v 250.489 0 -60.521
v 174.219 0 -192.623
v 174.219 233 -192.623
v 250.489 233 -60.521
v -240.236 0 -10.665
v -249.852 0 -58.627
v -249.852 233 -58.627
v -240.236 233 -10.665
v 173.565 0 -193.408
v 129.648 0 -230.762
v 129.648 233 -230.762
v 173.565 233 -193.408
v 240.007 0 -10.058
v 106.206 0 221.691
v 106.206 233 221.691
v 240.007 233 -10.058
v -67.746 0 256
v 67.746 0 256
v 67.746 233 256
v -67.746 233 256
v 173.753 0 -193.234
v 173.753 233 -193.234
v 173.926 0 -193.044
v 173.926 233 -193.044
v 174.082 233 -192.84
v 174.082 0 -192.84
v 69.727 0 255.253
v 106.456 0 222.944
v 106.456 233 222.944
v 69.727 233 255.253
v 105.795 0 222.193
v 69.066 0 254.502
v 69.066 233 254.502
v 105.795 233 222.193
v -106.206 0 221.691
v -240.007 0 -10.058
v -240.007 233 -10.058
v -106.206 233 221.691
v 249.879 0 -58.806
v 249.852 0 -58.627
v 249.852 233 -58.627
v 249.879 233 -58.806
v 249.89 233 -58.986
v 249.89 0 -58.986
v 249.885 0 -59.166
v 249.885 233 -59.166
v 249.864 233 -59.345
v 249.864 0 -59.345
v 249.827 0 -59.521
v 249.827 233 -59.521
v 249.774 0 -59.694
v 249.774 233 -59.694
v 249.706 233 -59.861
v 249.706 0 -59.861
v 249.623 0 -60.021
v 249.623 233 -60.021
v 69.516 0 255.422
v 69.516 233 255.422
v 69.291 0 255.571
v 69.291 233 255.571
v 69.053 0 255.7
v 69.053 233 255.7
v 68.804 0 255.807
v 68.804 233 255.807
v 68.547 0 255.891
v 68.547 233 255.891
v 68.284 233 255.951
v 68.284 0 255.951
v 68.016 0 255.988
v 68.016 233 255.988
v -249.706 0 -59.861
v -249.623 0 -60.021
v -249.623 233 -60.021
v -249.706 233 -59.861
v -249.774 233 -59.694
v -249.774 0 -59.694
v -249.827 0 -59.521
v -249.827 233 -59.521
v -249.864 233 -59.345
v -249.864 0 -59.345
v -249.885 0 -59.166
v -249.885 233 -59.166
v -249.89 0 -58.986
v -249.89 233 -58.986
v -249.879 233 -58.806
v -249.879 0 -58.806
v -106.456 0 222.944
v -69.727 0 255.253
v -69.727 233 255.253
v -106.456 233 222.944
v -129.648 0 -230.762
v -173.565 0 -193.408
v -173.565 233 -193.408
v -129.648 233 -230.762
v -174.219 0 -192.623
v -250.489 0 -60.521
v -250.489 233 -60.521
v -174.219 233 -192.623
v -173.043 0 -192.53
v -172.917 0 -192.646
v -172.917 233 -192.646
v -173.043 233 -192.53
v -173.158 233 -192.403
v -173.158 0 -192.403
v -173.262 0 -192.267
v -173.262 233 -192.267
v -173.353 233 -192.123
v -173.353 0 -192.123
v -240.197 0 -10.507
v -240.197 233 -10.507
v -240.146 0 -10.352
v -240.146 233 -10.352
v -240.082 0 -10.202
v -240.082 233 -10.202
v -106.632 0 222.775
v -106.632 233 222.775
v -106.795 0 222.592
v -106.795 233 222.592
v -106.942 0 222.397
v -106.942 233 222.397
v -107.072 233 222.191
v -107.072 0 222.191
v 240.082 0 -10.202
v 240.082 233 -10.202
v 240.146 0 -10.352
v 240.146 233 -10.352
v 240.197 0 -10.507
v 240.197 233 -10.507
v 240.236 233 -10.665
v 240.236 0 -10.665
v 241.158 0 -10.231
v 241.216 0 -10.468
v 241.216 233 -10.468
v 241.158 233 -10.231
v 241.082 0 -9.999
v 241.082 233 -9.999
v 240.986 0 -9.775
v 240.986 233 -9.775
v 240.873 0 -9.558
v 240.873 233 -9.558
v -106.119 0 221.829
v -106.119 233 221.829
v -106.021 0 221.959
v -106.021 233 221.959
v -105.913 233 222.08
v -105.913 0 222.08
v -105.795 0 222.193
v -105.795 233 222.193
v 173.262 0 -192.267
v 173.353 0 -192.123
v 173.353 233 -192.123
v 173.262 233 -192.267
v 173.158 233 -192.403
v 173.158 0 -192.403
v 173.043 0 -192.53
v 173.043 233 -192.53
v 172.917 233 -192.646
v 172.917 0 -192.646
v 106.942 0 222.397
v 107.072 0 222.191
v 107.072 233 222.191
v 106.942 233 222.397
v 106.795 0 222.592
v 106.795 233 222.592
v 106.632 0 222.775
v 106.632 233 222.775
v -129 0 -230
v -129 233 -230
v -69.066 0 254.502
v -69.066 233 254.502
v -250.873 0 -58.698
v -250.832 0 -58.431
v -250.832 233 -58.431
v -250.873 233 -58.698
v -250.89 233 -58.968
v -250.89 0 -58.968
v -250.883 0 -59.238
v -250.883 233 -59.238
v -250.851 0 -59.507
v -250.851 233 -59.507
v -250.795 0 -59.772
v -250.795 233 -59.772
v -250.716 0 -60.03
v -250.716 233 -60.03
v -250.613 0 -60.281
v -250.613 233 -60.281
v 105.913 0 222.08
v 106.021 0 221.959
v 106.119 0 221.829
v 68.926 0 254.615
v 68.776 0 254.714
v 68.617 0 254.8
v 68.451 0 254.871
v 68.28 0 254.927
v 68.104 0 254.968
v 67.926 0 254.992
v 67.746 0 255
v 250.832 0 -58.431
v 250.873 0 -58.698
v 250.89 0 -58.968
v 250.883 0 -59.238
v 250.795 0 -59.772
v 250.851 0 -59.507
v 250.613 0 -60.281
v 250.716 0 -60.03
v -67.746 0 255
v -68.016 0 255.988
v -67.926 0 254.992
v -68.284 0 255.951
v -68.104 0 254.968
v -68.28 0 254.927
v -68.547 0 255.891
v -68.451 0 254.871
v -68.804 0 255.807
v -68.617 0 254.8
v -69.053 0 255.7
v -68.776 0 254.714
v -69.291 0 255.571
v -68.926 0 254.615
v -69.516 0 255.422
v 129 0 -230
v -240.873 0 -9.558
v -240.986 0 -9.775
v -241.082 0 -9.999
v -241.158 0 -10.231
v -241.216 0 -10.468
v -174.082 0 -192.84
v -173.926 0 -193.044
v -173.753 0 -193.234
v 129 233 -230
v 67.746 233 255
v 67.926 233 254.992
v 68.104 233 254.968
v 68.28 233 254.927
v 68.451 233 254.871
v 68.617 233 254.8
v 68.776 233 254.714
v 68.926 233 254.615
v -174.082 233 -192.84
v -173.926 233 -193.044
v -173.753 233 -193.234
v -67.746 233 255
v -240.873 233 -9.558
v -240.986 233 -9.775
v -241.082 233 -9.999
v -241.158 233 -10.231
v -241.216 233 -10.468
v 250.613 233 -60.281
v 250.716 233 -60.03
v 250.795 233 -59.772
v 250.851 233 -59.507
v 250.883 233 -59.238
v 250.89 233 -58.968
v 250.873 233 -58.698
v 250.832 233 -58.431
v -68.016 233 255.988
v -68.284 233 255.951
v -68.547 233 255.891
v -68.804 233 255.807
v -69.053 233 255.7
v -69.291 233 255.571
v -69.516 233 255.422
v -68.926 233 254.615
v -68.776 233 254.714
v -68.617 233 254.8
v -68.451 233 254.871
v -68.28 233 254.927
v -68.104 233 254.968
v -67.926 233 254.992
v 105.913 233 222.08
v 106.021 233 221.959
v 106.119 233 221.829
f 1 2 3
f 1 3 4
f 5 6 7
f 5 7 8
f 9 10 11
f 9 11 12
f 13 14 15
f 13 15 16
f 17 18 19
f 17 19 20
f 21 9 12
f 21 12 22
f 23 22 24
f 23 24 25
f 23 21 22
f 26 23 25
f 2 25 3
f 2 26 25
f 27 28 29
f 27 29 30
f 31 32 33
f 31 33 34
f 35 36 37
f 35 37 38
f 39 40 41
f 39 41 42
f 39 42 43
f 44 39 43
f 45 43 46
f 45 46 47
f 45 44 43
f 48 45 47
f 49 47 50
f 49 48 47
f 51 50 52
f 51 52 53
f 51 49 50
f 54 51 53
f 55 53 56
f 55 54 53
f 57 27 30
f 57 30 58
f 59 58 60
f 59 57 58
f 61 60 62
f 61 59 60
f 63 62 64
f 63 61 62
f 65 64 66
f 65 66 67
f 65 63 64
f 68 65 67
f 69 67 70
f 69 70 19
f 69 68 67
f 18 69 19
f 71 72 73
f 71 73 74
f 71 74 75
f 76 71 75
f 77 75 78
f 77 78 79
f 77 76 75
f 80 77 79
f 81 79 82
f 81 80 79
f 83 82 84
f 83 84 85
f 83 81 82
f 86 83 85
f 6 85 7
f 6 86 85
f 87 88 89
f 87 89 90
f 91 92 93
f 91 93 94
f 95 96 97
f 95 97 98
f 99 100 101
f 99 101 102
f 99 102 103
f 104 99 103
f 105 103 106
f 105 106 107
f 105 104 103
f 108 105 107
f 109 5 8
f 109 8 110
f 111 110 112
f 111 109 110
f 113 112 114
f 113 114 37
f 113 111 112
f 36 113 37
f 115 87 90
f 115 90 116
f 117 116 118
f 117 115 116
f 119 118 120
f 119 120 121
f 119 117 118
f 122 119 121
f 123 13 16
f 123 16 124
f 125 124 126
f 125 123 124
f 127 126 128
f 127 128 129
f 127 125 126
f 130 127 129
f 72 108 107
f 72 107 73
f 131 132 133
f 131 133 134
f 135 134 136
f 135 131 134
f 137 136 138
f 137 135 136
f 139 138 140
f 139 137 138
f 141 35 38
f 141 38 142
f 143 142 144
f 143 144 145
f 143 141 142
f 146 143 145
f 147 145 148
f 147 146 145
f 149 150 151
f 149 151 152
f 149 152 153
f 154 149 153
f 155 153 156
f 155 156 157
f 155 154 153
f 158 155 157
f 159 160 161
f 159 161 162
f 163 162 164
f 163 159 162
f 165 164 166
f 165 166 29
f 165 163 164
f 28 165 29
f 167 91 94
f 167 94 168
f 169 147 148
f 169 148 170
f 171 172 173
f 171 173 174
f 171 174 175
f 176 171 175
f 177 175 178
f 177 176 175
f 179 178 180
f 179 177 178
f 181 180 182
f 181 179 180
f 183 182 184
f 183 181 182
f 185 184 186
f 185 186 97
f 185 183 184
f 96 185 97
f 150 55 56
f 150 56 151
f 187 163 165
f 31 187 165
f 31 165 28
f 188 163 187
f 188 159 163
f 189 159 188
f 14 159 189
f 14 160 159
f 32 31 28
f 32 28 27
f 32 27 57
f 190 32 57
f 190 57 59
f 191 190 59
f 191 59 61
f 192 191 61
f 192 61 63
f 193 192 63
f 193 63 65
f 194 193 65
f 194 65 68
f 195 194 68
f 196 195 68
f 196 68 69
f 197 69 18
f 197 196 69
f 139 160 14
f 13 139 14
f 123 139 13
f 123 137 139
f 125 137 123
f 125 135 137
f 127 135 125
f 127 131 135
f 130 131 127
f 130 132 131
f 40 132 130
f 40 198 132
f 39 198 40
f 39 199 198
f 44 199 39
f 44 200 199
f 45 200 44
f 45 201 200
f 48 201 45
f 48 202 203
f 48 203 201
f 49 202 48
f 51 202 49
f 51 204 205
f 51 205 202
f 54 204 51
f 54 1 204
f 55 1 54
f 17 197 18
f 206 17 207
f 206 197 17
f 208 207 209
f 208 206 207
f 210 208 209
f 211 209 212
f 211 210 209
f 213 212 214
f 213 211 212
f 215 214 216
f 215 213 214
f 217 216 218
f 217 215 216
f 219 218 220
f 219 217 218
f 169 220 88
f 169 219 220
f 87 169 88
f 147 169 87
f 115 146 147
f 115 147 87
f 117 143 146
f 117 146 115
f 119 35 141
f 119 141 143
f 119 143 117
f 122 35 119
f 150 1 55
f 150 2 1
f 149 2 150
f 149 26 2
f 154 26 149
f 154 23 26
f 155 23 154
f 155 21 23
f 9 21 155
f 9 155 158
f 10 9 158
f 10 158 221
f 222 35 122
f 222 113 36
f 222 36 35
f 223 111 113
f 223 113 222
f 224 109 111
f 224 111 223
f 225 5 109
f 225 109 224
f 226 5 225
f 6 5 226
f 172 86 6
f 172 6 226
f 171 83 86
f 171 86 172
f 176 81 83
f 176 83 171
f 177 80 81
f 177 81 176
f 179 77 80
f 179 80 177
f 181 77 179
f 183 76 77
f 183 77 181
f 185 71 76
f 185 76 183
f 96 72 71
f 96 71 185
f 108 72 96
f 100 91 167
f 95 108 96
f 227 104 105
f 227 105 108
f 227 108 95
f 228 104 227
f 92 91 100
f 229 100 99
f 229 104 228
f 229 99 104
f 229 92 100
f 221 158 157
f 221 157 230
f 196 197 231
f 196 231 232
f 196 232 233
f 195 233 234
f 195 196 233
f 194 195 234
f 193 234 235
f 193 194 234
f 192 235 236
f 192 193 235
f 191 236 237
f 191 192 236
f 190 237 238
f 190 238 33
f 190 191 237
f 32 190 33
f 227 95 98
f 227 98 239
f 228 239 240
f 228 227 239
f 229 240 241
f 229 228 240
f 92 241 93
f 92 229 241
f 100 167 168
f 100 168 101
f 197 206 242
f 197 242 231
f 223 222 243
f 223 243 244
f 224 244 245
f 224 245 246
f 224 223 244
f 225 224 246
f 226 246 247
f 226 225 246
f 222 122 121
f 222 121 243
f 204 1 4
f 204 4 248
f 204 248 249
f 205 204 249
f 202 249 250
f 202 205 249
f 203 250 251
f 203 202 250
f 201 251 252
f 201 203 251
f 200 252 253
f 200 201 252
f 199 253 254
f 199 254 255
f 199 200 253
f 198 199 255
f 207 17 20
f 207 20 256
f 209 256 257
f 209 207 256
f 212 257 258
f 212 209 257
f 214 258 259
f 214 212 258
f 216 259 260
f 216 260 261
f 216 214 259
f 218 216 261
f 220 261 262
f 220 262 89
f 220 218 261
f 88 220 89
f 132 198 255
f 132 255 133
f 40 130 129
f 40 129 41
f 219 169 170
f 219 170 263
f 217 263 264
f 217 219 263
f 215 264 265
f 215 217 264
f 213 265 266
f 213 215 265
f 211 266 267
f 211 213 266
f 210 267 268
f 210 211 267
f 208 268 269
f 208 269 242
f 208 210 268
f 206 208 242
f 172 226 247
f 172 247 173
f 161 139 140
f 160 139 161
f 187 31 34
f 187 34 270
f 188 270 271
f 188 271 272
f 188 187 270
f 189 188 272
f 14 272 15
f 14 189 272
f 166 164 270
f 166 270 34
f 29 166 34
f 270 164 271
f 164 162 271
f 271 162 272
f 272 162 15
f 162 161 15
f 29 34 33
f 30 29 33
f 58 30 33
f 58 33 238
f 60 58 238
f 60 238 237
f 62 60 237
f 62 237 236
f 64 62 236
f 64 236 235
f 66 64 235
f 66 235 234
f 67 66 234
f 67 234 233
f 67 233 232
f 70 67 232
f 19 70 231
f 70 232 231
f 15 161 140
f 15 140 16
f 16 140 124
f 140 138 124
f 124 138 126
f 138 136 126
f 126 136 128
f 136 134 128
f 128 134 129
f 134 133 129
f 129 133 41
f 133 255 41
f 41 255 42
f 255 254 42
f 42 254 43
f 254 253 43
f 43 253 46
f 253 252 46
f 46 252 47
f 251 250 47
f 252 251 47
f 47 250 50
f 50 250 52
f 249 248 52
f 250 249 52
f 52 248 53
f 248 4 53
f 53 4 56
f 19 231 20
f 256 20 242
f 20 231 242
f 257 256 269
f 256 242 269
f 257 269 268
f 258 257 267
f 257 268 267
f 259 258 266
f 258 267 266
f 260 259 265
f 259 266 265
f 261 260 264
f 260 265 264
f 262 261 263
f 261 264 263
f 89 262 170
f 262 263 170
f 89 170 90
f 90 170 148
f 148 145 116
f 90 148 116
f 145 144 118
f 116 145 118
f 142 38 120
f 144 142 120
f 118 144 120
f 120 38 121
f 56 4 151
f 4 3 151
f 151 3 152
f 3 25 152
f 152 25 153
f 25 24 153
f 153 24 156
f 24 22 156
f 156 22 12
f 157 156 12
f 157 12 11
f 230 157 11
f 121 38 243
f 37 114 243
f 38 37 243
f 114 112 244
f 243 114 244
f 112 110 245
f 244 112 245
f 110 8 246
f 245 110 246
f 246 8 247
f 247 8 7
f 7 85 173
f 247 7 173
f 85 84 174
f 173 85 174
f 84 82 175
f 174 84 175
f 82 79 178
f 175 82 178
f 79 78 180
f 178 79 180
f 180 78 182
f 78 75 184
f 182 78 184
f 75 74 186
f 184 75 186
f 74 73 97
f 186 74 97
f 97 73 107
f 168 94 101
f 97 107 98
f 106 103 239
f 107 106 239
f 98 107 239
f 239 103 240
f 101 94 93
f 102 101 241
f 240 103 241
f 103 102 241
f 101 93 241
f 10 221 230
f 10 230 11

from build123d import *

# Parameters (mm, degrees)
SM_BASE_FLANGE_1_DEPTH = 233


# Sheet-metal steps are written as plain solids
with BuildPart() as part:
    # 草图1 → 基体-法兰1 (new body)
    with BuildSketch(Plane(origin=(0, 0, 0), x_dir=(1, 0, 0), z_dir=(0, 1, 0))):
        with BuildLine():
            Line((-129, 230), (-172.917182347, 192.646402715))
            ThreePointArc((-172.917182347, 192.646402715), (-173.157776183, 192.403386175), (-173.353453197, 192.122934861))
            Line((-173.353453197, 192.122934861), (-249.622758888, 60.020622347))
            ThreePointArc((-249.622758888, 60.020622347), (-249.864241735, 59.344913751), (-249.8516834, 58.627461063))
            Line((-249.8516834, 58.627461063), (-240.235572229, 10.665066397))
            ThreePointArc((-240.235572229, 10.665066397), (-240.145872891, 10.352305448), (-240.006647716, 10.058227681))
            Line((-240.006647716, 10.058227681), (-106.206165205, -221.691006107))
            ThreePointArc((-106.206165205, -221.691006107), (-106.021098975, -221.958617528), (-105.795089717, -222.192679908))
            Line((-105.795089717, -222.192679908), (-69.066493095, -254.501673801))
            ThreePointArc((-69.066493095, -254.501673801), (-68.451440008, -254.871275982), (-67.745517775, -255))
            Line((-67.745517775, -255), (67.745517775, -255))
            ThreePointArc((67.745517775, -255), (68.451440008, -254.871275982), (69.066493095, -254.501673801))
            Line((69.066493095, -254.501673801), (105.795089717, -222.192679908))
            ThreePointArc((105.795089717, -222.192679908), (106.021098975, -221.958617528), (106.206165205, -221.691006107))
            Line((106.206165205, -221.691006107), (240.006647716, 10.058227681))
            ThreePointArc((240.006647716, 10.058227681), (240.145872891, 10.352305448), (240.235572229, 10.665066397))
            Line((240.235572229, 10.665066397), (249.8516834, 58.627461063))
            ThreePointArc((249.8516834, 58.627461063), (249.864241735, 59.344913751), (249.622758888, 60.020622347))
            Line((249.622758888, 60.020622347), (173.353453197, 192.122934861))
            ThreePointArc((173.353453197, 192.122934861), (173.157776183, 192.403386175), (172.917182347, 192.646402715))
            Line((172.917182347, 192.646402715), (129, 230))
            Line((129, 230), (129.647889979, 230.761733927))
            Line((129.647889979, 230.761733927), (173.565072326, 193.408136642))
            ThreePointArc((173.565072326, 193.408136642), (173.92596308, 193.043611831), (174.219478601, 192.622934861))
            Line((174.219478601, 192.622934861), (250.488784291, 60.520622347))
            ThreePointArc((250.488784291, 60.520622347), (250.851008562, 59.507059453), (250.83217106, 58.430880421))
            Line((250.83217106, 58.430880421), (241.216059889, 10.468485755))
            ThreePointArc((241.216059889, 10.468485755), (241.081510882, 9.999344331), (240.87267312, 9.558227681))
            Line((240.87267312, 9.558227681), (107.072190608, -222.191006107))
            ThreePointArc((107.072190608, -222.191006107), (106.794591264, -222.592423239), (106.455577377, -222.943516809))
            Line((106.455577377, -222.943516809), (69.726980755, -255.252510702))
            ThreePointArc((69.726980755, -255.252510702), (68.804401125, -255.806913973), (67.745517775, -256))
            Line((67.745517775, -256), (-67.745517775, -256))
            ThreePointArc((-67.745517775, -256), (-68.804401125, -255.806913973), (-69.726980755, -255.252510702))
            Line((-69.726980755, -255.252510702), (-106.455577377, -222.943516809))
            ThreePointArc((-106.455577377, -222.943516809), (-106.794591264, -222.592423239), (-107.072190608, -222.191006107))
            Line((-107.072190608, -222.191006107), (-240.87267312, 9.558227681))
            ThreePointArc((-240.87267312, 9.558227681), (-241.081510882, 9.999344331), (-241.216059889, 10.468485754))
            Line((-241.216059889, 10.468485755), (-250.83217106, 58.430880421))
            ThreePointArc((-250.83217106, 58.430880421), (-250.851008562, 59.507059453), (-250.488784291, 60.520622347))
            Line((-250.488784291, 60.520622347), (-174.219478601, 192.622934861))
            ThreePointArc((-174.219478601, 192.622934861), (-173.92596308, 193.043611831), (-173.565072326, 193.408136642))
            Line((-173.565072326, 193.408136642), (-129.647889979, 230.761733927))
            Line((-129.647889979, 230.761733927), (-129, 230))
        make_face()
    extrude(amount=SM_BASE_FLANGE_1_DEPTH)


solid = part.part
